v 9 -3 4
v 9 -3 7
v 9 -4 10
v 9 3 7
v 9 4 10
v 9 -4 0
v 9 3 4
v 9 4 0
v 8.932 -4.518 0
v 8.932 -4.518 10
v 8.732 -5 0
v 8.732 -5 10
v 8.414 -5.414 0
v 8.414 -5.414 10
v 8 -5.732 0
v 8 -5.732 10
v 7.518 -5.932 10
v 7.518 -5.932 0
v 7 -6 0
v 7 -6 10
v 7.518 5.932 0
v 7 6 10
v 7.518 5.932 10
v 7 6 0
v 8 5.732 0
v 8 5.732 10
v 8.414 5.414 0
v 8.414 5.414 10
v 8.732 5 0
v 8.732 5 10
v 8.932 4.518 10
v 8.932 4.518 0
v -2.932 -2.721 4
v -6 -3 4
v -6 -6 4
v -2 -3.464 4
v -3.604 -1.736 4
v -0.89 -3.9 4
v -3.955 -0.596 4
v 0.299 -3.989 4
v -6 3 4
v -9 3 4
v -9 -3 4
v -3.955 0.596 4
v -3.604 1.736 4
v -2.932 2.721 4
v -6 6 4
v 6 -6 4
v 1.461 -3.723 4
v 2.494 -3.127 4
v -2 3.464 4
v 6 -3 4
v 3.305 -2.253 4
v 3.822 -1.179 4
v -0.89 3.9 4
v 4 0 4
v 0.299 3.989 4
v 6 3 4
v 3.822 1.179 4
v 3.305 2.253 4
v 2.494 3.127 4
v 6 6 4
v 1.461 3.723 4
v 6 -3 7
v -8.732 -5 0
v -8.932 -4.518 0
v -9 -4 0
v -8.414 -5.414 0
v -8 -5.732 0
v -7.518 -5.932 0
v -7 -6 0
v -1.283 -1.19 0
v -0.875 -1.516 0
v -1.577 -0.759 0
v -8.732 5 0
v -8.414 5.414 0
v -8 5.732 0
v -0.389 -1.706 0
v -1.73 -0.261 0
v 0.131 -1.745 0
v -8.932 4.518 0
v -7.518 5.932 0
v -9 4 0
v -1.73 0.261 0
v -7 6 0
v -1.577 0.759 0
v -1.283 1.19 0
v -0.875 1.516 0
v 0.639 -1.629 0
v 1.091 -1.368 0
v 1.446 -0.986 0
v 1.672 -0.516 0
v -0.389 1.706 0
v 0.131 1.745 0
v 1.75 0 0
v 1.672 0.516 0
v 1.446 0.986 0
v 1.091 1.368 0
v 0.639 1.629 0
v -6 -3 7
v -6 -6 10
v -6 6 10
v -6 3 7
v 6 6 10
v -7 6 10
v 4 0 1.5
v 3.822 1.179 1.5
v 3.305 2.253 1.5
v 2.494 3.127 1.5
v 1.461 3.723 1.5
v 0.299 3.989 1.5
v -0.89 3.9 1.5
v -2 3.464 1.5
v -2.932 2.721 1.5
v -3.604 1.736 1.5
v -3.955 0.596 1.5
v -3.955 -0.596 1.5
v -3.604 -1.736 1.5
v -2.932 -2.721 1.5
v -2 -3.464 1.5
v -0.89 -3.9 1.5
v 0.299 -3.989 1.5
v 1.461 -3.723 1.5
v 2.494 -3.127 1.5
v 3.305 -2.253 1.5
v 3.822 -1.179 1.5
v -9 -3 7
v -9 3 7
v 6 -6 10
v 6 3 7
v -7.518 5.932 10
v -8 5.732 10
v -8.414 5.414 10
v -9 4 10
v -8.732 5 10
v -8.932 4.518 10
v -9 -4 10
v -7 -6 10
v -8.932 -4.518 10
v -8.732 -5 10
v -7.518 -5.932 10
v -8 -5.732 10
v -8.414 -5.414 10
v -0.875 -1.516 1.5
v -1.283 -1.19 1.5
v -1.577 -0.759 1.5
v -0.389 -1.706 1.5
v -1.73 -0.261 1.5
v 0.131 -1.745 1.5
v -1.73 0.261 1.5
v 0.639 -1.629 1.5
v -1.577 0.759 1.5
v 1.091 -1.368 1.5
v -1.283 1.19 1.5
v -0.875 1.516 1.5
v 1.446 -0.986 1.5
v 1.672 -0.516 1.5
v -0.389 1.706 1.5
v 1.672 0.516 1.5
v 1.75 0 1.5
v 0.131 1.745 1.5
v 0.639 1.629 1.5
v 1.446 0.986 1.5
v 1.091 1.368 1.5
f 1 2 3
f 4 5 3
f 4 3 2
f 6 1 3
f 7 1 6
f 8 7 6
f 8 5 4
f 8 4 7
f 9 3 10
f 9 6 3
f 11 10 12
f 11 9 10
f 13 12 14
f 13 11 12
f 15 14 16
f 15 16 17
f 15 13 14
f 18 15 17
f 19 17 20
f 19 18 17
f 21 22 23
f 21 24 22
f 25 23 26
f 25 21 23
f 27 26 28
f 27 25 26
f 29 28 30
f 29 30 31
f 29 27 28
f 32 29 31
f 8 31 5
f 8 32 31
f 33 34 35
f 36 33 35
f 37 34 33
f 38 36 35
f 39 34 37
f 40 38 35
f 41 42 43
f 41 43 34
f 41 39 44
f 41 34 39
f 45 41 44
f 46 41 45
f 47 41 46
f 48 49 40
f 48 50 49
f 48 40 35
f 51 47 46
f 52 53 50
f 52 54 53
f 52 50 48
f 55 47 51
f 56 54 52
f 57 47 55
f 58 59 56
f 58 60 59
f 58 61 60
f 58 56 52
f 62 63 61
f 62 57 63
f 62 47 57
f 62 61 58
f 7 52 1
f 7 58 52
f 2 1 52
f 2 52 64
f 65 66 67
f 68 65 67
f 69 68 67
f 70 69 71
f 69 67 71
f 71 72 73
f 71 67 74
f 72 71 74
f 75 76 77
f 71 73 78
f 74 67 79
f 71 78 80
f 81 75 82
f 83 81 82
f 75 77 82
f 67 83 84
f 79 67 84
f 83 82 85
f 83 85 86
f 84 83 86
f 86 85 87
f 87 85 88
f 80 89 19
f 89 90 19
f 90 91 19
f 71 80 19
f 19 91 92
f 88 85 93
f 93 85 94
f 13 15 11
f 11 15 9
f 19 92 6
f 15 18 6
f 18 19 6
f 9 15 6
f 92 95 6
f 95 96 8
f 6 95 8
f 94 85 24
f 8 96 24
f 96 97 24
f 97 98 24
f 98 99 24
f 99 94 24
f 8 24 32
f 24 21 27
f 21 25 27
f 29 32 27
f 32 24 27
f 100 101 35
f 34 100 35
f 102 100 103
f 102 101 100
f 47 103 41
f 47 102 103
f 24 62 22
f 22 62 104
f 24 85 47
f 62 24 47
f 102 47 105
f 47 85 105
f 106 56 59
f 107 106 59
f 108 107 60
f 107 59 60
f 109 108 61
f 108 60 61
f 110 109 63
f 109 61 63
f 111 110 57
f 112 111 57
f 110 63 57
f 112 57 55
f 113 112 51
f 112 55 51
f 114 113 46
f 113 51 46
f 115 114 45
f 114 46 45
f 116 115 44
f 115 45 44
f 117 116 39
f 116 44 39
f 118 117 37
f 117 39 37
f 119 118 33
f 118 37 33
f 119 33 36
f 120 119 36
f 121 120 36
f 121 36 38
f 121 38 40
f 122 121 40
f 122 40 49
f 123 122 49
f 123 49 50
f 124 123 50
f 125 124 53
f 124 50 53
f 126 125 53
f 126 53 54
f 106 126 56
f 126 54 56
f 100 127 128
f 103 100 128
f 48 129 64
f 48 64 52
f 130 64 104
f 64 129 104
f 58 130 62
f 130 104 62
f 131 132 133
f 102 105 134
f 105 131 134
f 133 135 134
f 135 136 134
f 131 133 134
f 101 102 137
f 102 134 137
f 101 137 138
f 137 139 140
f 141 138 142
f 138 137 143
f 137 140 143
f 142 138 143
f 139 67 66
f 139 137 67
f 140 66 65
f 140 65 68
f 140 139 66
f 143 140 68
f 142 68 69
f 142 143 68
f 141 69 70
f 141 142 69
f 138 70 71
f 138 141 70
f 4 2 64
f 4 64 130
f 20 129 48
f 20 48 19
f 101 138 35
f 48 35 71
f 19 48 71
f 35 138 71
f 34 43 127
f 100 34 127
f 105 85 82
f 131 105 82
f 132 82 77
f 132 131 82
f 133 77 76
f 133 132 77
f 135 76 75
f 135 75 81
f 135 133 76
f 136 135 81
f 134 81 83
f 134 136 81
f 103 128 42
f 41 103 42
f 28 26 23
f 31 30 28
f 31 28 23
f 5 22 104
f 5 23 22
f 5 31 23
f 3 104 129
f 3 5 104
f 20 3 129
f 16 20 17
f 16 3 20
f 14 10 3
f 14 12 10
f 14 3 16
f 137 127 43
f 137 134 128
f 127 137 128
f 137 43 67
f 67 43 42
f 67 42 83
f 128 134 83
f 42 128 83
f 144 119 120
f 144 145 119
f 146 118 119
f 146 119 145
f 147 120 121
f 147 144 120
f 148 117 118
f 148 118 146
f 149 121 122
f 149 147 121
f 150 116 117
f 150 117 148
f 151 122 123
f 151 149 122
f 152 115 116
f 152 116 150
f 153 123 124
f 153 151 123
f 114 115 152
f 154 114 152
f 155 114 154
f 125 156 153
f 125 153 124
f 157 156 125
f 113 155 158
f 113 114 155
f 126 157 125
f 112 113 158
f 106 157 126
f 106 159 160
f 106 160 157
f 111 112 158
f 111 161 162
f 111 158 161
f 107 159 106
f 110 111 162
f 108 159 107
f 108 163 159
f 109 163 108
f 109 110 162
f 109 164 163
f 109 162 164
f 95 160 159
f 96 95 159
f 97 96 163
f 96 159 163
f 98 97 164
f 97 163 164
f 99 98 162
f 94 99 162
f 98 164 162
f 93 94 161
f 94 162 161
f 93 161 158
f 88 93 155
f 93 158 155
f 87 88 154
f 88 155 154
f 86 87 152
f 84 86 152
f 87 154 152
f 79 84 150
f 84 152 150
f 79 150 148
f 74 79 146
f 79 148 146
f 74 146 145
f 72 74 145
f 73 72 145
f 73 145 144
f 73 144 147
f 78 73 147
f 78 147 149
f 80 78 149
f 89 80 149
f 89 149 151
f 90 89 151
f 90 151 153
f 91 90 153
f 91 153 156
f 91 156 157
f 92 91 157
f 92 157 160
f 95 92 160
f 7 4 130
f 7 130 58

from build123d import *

# Parameters (mm, degrees)
SKETCH1_W           = 18
SKETCH1_H           = 12
BOSS_EXTRUDE1_DEPTH = 4
BOSS_EXTRUDE2_DEPTH = 3
SKETCH3_R           = 1.75
CUT_EXTRUDE1_DEPTH  = 13.369316877
SKETCH4_R           = 4
CUT_EXTRUDE2_DEPTH  = 2.5
FILLET1_R           = 2


with BuildPart() as part:
    # Sketch1 → Boss-Extrude1 (new body)
    with BuildSketch(Plane.XY):
        Rectangle(SKETCH1_W, SKETCH1_H)
    extrude(amount=BOSS_EXTRUDE1_DEPTH)

    # Sketch2 → Boss-Extrude2 (add)
    with BuildSketch(Plane(origin=(9, 0, 0), x_dir=(0, 0, -1), z_dir=(1, 0, 0))):
        Polygon((-4, 6), (-10, 6), (-10, -6), (-4, -6), (-4, -3), (-7, -3), (-7, 3), (-4, 3), align=None)
    boss_extrude2 = extrude(amount=-BOSS_EXTRUDE2_DEPTH)

    # Mirror1: Boss-Extrude2 across plane
    add(boss_extrude2.mirror(Plane(origin=(0, 0, 0), x_dir=(0, 0, 1), z_dir=(1, 0, 0))))

    # Sketch3 → Cut-Extrude1 (cut, through all)
    with BuildSketch(Plane.XY.offset(4)):
        Circle(SKETCH3_R)
    extrude(amount=-CUT_EXTRUDE1_DEPTH, mode=Mode.SUBTRACT)

    # Sketch4 → Cut-Extrude2 (cut)
    with BuildSketch(Plane.XY.offset(4)):
        Circle(SKETCH4_R)
    extrude(amount=-CUT_EXTRUDE2_DEPTH, mode=Mode.SUBTRACT)

    # Fillet1
    fillet1_edges = [part.edges().sort_by_distance(p)[0] for p in [
        (-9, 6, 5),
        (9, 6, 5),
        (9, -6, 5),
        (-9, -6, 5),
    ]]
    fillet(fillet1_edges, radius=FILLET1_R)


solid = part.part
